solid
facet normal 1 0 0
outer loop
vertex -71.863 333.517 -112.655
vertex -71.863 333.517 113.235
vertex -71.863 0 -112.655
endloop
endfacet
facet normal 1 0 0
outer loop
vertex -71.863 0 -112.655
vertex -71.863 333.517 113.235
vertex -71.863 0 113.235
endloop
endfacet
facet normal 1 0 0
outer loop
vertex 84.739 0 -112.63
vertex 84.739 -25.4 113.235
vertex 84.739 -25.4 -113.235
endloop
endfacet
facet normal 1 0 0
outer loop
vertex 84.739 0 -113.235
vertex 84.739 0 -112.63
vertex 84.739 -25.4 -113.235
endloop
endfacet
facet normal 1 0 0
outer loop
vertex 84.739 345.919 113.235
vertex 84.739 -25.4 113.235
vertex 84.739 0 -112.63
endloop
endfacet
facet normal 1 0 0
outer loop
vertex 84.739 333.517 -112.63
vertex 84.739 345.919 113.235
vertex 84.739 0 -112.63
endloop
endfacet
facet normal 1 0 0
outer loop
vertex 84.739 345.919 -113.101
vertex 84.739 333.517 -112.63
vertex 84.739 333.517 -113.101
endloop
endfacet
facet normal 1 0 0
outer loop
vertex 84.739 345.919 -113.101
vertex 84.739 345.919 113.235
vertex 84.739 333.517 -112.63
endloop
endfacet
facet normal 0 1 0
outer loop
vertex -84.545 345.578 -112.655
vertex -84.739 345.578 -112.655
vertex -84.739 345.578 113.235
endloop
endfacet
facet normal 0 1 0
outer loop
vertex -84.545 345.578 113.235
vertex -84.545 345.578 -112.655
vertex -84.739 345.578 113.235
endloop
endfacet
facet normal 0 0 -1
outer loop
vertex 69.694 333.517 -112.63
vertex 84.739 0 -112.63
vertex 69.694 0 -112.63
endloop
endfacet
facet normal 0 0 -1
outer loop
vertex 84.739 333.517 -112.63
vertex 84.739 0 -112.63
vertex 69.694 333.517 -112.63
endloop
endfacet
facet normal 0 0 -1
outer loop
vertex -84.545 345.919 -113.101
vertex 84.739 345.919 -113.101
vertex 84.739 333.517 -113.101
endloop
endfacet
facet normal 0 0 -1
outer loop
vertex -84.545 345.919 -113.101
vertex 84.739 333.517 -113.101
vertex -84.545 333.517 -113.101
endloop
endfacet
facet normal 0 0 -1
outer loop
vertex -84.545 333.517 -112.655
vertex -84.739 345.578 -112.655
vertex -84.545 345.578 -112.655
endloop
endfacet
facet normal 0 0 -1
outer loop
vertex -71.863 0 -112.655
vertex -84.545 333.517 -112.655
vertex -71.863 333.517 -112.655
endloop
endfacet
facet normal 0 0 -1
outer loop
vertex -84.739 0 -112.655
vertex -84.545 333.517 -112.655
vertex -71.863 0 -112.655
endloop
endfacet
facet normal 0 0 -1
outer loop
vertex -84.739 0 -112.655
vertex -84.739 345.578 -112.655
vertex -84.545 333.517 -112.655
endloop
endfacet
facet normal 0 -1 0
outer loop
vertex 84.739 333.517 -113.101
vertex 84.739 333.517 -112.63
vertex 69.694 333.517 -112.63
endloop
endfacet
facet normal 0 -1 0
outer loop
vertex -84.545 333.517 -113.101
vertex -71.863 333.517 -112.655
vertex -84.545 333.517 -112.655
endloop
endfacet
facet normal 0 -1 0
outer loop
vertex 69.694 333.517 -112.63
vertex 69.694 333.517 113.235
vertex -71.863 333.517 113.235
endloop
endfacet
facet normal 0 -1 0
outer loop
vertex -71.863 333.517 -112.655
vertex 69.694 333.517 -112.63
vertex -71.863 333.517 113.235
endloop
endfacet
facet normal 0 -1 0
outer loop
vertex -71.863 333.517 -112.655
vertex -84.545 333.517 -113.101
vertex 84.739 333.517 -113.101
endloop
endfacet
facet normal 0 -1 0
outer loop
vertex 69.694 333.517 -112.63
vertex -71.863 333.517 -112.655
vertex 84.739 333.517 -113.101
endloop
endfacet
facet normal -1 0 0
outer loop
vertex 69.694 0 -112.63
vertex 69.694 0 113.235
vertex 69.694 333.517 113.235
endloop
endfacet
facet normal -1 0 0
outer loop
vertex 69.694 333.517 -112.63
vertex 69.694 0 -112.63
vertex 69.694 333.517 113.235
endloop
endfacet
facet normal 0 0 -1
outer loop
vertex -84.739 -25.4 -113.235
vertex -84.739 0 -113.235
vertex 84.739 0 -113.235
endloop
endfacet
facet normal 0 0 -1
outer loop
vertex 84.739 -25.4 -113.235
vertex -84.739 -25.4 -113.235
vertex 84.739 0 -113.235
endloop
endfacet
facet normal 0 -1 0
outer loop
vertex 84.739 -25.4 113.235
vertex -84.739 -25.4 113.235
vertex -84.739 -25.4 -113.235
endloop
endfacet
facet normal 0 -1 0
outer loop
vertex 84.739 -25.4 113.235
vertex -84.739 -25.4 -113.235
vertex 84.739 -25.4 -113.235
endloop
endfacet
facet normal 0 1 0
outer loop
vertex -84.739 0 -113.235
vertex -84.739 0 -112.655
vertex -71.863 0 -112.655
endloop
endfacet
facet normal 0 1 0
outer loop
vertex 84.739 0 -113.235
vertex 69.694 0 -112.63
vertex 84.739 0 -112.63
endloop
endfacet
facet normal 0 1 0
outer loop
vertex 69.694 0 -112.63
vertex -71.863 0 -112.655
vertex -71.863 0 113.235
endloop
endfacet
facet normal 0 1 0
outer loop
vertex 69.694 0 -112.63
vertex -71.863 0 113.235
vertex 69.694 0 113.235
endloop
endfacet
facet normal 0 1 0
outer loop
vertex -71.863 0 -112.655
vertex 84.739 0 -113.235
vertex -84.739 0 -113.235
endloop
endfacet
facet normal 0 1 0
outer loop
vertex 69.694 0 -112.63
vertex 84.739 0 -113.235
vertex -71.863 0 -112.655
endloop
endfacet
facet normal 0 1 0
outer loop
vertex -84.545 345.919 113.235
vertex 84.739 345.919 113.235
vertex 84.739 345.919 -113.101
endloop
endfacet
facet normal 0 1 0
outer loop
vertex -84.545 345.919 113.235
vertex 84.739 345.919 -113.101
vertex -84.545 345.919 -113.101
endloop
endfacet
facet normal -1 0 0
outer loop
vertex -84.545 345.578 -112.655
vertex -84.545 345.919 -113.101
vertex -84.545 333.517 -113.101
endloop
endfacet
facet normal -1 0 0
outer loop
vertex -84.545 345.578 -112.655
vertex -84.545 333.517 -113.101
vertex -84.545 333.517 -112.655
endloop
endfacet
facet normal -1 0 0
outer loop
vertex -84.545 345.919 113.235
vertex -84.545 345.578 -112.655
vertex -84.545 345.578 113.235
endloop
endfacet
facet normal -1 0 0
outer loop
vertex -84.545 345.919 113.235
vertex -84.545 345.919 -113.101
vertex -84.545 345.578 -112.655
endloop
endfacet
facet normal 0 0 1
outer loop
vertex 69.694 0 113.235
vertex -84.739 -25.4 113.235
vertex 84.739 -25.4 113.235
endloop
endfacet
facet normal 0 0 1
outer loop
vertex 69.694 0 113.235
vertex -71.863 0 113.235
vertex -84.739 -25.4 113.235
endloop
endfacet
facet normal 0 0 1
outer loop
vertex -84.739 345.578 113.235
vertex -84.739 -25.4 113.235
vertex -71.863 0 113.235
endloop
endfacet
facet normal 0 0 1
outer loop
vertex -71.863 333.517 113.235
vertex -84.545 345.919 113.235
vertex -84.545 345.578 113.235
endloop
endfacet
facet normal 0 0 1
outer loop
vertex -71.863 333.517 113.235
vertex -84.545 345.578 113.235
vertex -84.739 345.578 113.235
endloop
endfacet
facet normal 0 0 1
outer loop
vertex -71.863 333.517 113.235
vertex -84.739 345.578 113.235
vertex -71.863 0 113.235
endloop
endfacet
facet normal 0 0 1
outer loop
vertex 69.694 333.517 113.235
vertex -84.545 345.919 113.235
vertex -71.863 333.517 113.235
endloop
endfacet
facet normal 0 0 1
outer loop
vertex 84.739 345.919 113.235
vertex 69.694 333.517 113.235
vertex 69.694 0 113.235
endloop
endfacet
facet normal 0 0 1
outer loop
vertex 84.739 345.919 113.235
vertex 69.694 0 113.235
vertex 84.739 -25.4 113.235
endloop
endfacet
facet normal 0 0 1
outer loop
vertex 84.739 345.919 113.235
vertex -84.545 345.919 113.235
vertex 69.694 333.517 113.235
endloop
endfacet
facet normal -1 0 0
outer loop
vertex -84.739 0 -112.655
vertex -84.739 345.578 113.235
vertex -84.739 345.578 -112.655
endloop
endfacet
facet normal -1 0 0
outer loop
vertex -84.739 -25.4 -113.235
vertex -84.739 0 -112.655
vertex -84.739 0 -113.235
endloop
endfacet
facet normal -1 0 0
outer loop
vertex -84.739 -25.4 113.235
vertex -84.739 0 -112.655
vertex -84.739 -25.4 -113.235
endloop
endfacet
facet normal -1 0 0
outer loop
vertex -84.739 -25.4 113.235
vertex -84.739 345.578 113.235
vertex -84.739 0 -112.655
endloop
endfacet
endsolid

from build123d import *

# Parameters (mm, degrees)
F0_W     = 169.4771945477
F0_H     = 226.4695465565
F1_DEPTH = 25.4
F3_W     = 345.577955246
F3_H     = 225.8900702
F4_DEPTH = 12.8757357597
F2_W     = 345.919251442
F2_H     = 225.8651852608
F5_DEPTH = 15.0449182838
F7_DEPTH = 12.402491644


with BuildPart() as f1:
    # F0 (on Front) → F1 (new body)
    with BuildSketch(Plane.XZ):
        Rectangle(F0_W, F0_H)
    extrude(amount=F1_DEPTH)

    # F3 (on face) → F4 (join)
    with BuildSketch(Plane(origin=(-84.7385972738, 0, 0), x_dir=(0, -1, 0), z_dir=(-1, 0, 0))):
        with Locations((-172.788977623, 0.2897381783)):
            Rectangle(F3_W, F3_H)
    extrude(amount=-F4_DEPTH)

    # F2 (on face) → F5 (join)
    with BuildSketch(Plane.YZ.offset(84.7385972738)):
        with Locations((172.959625721, 0.3021806479)):
            Rectangle(F2_W, F2_H)
    extrude(amount=-F5_DEPTH)

    # F6 (on face) → F7 (join)
    with BuildSketch(Plane(origin=(0, 345.919251442, 0), x_dir=(-1, 0, 0), z_dir=(0, 1, 0))):
        Polygon((84.5447480679, 113.2347732782), (-69.69367899, 113.2347732782), (-69.69367899, -112.6304119825), (-84.7385972738, -112.6304119825), (-84.7385972738, -113.1013929844), (84.5447480679, -113.1013929844), align=None)
    extrude(amount=-F7_DEPTH)


solid = f1.part
